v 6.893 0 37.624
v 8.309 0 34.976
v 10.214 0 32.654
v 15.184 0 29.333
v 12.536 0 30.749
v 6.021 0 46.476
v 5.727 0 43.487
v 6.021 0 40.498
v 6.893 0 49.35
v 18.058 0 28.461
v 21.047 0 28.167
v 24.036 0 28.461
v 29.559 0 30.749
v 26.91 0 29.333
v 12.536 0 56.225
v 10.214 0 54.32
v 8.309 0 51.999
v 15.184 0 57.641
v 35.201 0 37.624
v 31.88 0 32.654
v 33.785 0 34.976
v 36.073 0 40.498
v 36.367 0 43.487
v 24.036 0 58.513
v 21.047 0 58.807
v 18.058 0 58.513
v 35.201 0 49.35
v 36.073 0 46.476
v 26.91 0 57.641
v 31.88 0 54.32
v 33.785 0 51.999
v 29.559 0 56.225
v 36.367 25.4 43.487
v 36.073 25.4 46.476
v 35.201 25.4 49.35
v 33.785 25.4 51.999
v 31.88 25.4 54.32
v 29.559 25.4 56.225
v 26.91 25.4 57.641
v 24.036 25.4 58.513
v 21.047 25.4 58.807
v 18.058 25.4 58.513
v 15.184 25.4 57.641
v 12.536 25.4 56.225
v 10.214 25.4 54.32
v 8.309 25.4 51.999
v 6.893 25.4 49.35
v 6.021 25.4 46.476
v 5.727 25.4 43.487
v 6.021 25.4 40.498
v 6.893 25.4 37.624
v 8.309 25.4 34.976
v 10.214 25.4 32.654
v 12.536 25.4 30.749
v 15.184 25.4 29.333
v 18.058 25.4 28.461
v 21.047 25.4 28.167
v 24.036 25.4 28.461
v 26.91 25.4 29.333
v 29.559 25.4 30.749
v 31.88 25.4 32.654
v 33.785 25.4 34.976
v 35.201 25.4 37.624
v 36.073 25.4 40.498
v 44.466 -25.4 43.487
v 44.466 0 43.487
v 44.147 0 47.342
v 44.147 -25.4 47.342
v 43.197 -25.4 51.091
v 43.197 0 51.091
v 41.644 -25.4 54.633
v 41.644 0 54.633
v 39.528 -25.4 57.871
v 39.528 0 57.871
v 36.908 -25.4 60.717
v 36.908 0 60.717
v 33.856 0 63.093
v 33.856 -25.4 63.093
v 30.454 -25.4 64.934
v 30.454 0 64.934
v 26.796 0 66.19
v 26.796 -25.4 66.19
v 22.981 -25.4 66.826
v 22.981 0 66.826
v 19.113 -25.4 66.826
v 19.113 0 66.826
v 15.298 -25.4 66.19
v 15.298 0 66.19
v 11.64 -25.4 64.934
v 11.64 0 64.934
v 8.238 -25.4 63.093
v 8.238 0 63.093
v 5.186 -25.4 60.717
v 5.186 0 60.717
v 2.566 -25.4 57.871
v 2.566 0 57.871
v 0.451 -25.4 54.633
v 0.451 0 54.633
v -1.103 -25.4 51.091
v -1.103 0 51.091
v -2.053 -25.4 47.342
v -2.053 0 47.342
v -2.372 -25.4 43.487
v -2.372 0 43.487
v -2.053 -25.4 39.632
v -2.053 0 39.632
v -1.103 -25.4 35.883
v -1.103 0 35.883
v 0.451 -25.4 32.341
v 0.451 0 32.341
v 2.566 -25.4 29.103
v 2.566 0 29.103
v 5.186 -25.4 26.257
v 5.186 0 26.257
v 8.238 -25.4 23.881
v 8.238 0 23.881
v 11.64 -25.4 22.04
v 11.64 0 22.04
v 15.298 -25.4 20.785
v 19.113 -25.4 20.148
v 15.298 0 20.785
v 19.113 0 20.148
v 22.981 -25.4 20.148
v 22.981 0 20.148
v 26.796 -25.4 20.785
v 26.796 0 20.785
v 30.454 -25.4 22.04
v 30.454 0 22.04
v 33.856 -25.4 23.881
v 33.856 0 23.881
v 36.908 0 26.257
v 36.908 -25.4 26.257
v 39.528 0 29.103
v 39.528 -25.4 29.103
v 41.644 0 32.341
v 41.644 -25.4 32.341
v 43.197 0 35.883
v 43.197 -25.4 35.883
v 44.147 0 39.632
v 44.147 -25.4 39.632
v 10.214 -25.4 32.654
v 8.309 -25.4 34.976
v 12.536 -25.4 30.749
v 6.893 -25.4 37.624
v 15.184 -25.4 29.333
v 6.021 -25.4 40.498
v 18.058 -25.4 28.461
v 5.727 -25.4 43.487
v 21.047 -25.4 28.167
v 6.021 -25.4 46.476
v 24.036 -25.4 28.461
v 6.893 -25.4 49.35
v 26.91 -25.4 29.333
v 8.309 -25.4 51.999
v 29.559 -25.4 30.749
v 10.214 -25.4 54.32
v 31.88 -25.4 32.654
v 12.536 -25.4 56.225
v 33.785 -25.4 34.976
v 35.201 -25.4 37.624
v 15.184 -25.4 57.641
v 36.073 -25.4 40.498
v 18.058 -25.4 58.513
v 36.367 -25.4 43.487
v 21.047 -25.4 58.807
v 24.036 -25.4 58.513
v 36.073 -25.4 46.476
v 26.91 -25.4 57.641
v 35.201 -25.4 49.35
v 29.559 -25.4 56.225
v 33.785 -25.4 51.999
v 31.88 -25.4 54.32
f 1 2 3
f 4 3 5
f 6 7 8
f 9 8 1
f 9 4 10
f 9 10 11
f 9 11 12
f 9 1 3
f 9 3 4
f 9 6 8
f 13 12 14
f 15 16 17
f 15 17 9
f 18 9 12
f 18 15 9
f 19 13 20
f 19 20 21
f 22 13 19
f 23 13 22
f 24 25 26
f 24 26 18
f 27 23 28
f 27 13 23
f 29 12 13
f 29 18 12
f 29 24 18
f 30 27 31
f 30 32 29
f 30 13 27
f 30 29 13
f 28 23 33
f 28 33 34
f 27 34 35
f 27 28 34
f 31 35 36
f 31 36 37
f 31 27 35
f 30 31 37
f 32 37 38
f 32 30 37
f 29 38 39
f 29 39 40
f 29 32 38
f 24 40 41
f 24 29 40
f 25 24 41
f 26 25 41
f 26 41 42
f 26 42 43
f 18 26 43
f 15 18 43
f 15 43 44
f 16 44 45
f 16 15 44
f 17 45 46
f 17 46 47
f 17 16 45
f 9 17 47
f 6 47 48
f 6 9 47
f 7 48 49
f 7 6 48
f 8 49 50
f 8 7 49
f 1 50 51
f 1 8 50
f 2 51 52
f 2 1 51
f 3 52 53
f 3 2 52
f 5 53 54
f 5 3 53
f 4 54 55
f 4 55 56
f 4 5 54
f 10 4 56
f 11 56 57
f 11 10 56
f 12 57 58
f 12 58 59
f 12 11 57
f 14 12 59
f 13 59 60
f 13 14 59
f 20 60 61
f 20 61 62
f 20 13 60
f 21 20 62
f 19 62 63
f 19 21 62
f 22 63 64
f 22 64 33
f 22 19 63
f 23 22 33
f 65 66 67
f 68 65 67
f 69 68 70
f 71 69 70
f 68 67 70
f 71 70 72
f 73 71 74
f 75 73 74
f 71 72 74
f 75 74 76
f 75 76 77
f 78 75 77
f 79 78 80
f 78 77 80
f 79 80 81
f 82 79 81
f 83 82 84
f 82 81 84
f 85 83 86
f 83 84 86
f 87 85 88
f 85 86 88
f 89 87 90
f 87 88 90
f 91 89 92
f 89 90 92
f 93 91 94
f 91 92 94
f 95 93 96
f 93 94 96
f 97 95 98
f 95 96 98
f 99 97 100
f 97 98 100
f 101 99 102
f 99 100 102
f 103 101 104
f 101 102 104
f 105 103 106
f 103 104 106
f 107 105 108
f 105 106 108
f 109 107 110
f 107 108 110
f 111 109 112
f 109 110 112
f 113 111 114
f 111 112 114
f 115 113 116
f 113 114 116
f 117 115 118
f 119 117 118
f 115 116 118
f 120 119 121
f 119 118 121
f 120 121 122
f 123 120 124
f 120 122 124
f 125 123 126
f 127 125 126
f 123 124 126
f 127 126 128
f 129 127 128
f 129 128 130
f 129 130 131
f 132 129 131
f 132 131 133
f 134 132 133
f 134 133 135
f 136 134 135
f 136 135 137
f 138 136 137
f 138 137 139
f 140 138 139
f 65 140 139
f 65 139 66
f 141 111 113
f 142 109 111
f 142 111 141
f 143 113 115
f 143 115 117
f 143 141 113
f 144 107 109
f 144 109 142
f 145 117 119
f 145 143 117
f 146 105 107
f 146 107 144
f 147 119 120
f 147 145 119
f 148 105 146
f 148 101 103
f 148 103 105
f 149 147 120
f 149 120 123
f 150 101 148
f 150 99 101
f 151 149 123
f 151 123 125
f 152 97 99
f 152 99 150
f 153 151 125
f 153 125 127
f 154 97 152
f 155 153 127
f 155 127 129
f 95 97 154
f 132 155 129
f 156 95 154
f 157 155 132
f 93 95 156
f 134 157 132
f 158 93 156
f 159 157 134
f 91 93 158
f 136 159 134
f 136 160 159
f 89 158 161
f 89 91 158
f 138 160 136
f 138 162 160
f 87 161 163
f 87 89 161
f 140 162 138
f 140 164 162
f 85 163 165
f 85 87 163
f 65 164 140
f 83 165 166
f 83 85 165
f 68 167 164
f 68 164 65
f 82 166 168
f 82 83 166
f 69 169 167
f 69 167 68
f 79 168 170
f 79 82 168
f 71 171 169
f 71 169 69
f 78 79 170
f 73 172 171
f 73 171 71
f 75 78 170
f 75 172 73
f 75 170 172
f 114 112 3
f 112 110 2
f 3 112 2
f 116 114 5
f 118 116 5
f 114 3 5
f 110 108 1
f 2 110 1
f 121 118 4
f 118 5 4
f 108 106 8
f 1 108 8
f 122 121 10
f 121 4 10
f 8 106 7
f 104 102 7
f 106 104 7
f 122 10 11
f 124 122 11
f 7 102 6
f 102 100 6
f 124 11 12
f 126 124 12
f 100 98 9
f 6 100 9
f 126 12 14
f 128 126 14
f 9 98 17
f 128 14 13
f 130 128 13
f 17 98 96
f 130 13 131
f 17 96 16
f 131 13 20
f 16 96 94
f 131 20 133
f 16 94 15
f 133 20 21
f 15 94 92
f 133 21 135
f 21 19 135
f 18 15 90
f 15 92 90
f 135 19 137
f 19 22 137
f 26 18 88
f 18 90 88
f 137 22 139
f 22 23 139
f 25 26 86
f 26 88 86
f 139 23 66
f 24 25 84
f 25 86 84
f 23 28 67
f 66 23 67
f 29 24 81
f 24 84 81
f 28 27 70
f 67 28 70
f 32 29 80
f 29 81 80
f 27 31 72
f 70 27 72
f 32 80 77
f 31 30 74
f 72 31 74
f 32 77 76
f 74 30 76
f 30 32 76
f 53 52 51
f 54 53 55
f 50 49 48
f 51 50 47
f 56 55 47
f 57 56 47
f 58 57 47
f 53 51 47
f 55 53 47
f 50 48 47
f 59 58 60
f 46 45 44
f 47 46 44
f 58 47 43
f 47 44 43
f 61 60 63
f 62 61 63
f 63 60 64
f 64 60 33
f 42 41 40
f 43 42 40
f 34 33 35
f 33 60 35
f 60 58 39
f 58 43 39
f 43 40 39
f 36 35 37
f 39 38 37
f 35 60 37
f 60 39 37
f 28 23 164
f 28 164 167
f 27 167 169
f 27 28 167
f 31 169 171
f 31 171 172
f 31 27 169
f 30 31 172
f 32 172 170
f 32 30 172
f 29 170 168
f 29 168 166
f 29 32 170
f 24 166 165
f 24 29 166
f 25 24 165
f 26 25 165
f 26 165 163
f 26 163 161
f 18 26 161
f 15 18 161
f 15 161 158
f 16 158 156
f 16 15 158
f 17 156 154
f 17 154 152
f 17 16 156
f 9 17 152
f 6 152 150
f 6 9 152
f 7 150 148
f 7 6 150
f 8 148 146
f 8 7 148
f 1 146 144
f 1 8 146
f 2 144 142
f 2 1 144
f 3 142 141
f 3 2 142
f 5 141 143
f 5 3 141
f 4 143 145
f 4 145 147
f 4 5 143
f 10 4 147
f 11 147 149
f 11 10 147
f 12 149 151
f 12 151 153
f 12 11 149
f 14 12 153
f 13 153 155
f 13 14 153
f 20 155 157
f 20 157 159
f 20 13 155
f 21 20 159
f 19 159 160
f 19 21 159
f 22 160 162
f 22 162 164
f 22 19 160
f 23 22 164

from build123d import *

# Parameters (mm, degrees)
F0_R     = 23.419168
F0_R_2   = 15.320285
F1_DEPTH = 25.4
F0_R_3   = 9.367665
F2_DEPTH = 25.4
F3_DEPTH = 25.4


with BuildPart() as f1:
    # F0 (on Front) → F1 (new body)
    with BuildSketch(Plane.XZ):
        with Locations((21.047119, 43.487061)):
            Circle(F0_R)
        with Locations((21.047119, 43.487061)):
            Circle(F0_R_2, mode=Mode.SUBTRACT)
    extrude(amount=F1_DEPTH)

    # F0 (on Front) → F2 (join)
    with BuildSketch(Plane.XZ):
        with Locations((21.047119, 43.487061)):
            Circle(F0_R_2)
        with Locations((21.047119, 43.487061)):
            Circle(F0_R_3, mode=Mode.SUBTRACT)
    extrude(amount=-F2_DEPTH)

    # F0 (on Front) → F3 (join)
    with BuildSketch(Plane.XZ):
        with Locations((21.047119, 43.487061)):
            Circle(F0_R_3)
    extrude(amount=-F3_DEPTH)


solid = f1.part
